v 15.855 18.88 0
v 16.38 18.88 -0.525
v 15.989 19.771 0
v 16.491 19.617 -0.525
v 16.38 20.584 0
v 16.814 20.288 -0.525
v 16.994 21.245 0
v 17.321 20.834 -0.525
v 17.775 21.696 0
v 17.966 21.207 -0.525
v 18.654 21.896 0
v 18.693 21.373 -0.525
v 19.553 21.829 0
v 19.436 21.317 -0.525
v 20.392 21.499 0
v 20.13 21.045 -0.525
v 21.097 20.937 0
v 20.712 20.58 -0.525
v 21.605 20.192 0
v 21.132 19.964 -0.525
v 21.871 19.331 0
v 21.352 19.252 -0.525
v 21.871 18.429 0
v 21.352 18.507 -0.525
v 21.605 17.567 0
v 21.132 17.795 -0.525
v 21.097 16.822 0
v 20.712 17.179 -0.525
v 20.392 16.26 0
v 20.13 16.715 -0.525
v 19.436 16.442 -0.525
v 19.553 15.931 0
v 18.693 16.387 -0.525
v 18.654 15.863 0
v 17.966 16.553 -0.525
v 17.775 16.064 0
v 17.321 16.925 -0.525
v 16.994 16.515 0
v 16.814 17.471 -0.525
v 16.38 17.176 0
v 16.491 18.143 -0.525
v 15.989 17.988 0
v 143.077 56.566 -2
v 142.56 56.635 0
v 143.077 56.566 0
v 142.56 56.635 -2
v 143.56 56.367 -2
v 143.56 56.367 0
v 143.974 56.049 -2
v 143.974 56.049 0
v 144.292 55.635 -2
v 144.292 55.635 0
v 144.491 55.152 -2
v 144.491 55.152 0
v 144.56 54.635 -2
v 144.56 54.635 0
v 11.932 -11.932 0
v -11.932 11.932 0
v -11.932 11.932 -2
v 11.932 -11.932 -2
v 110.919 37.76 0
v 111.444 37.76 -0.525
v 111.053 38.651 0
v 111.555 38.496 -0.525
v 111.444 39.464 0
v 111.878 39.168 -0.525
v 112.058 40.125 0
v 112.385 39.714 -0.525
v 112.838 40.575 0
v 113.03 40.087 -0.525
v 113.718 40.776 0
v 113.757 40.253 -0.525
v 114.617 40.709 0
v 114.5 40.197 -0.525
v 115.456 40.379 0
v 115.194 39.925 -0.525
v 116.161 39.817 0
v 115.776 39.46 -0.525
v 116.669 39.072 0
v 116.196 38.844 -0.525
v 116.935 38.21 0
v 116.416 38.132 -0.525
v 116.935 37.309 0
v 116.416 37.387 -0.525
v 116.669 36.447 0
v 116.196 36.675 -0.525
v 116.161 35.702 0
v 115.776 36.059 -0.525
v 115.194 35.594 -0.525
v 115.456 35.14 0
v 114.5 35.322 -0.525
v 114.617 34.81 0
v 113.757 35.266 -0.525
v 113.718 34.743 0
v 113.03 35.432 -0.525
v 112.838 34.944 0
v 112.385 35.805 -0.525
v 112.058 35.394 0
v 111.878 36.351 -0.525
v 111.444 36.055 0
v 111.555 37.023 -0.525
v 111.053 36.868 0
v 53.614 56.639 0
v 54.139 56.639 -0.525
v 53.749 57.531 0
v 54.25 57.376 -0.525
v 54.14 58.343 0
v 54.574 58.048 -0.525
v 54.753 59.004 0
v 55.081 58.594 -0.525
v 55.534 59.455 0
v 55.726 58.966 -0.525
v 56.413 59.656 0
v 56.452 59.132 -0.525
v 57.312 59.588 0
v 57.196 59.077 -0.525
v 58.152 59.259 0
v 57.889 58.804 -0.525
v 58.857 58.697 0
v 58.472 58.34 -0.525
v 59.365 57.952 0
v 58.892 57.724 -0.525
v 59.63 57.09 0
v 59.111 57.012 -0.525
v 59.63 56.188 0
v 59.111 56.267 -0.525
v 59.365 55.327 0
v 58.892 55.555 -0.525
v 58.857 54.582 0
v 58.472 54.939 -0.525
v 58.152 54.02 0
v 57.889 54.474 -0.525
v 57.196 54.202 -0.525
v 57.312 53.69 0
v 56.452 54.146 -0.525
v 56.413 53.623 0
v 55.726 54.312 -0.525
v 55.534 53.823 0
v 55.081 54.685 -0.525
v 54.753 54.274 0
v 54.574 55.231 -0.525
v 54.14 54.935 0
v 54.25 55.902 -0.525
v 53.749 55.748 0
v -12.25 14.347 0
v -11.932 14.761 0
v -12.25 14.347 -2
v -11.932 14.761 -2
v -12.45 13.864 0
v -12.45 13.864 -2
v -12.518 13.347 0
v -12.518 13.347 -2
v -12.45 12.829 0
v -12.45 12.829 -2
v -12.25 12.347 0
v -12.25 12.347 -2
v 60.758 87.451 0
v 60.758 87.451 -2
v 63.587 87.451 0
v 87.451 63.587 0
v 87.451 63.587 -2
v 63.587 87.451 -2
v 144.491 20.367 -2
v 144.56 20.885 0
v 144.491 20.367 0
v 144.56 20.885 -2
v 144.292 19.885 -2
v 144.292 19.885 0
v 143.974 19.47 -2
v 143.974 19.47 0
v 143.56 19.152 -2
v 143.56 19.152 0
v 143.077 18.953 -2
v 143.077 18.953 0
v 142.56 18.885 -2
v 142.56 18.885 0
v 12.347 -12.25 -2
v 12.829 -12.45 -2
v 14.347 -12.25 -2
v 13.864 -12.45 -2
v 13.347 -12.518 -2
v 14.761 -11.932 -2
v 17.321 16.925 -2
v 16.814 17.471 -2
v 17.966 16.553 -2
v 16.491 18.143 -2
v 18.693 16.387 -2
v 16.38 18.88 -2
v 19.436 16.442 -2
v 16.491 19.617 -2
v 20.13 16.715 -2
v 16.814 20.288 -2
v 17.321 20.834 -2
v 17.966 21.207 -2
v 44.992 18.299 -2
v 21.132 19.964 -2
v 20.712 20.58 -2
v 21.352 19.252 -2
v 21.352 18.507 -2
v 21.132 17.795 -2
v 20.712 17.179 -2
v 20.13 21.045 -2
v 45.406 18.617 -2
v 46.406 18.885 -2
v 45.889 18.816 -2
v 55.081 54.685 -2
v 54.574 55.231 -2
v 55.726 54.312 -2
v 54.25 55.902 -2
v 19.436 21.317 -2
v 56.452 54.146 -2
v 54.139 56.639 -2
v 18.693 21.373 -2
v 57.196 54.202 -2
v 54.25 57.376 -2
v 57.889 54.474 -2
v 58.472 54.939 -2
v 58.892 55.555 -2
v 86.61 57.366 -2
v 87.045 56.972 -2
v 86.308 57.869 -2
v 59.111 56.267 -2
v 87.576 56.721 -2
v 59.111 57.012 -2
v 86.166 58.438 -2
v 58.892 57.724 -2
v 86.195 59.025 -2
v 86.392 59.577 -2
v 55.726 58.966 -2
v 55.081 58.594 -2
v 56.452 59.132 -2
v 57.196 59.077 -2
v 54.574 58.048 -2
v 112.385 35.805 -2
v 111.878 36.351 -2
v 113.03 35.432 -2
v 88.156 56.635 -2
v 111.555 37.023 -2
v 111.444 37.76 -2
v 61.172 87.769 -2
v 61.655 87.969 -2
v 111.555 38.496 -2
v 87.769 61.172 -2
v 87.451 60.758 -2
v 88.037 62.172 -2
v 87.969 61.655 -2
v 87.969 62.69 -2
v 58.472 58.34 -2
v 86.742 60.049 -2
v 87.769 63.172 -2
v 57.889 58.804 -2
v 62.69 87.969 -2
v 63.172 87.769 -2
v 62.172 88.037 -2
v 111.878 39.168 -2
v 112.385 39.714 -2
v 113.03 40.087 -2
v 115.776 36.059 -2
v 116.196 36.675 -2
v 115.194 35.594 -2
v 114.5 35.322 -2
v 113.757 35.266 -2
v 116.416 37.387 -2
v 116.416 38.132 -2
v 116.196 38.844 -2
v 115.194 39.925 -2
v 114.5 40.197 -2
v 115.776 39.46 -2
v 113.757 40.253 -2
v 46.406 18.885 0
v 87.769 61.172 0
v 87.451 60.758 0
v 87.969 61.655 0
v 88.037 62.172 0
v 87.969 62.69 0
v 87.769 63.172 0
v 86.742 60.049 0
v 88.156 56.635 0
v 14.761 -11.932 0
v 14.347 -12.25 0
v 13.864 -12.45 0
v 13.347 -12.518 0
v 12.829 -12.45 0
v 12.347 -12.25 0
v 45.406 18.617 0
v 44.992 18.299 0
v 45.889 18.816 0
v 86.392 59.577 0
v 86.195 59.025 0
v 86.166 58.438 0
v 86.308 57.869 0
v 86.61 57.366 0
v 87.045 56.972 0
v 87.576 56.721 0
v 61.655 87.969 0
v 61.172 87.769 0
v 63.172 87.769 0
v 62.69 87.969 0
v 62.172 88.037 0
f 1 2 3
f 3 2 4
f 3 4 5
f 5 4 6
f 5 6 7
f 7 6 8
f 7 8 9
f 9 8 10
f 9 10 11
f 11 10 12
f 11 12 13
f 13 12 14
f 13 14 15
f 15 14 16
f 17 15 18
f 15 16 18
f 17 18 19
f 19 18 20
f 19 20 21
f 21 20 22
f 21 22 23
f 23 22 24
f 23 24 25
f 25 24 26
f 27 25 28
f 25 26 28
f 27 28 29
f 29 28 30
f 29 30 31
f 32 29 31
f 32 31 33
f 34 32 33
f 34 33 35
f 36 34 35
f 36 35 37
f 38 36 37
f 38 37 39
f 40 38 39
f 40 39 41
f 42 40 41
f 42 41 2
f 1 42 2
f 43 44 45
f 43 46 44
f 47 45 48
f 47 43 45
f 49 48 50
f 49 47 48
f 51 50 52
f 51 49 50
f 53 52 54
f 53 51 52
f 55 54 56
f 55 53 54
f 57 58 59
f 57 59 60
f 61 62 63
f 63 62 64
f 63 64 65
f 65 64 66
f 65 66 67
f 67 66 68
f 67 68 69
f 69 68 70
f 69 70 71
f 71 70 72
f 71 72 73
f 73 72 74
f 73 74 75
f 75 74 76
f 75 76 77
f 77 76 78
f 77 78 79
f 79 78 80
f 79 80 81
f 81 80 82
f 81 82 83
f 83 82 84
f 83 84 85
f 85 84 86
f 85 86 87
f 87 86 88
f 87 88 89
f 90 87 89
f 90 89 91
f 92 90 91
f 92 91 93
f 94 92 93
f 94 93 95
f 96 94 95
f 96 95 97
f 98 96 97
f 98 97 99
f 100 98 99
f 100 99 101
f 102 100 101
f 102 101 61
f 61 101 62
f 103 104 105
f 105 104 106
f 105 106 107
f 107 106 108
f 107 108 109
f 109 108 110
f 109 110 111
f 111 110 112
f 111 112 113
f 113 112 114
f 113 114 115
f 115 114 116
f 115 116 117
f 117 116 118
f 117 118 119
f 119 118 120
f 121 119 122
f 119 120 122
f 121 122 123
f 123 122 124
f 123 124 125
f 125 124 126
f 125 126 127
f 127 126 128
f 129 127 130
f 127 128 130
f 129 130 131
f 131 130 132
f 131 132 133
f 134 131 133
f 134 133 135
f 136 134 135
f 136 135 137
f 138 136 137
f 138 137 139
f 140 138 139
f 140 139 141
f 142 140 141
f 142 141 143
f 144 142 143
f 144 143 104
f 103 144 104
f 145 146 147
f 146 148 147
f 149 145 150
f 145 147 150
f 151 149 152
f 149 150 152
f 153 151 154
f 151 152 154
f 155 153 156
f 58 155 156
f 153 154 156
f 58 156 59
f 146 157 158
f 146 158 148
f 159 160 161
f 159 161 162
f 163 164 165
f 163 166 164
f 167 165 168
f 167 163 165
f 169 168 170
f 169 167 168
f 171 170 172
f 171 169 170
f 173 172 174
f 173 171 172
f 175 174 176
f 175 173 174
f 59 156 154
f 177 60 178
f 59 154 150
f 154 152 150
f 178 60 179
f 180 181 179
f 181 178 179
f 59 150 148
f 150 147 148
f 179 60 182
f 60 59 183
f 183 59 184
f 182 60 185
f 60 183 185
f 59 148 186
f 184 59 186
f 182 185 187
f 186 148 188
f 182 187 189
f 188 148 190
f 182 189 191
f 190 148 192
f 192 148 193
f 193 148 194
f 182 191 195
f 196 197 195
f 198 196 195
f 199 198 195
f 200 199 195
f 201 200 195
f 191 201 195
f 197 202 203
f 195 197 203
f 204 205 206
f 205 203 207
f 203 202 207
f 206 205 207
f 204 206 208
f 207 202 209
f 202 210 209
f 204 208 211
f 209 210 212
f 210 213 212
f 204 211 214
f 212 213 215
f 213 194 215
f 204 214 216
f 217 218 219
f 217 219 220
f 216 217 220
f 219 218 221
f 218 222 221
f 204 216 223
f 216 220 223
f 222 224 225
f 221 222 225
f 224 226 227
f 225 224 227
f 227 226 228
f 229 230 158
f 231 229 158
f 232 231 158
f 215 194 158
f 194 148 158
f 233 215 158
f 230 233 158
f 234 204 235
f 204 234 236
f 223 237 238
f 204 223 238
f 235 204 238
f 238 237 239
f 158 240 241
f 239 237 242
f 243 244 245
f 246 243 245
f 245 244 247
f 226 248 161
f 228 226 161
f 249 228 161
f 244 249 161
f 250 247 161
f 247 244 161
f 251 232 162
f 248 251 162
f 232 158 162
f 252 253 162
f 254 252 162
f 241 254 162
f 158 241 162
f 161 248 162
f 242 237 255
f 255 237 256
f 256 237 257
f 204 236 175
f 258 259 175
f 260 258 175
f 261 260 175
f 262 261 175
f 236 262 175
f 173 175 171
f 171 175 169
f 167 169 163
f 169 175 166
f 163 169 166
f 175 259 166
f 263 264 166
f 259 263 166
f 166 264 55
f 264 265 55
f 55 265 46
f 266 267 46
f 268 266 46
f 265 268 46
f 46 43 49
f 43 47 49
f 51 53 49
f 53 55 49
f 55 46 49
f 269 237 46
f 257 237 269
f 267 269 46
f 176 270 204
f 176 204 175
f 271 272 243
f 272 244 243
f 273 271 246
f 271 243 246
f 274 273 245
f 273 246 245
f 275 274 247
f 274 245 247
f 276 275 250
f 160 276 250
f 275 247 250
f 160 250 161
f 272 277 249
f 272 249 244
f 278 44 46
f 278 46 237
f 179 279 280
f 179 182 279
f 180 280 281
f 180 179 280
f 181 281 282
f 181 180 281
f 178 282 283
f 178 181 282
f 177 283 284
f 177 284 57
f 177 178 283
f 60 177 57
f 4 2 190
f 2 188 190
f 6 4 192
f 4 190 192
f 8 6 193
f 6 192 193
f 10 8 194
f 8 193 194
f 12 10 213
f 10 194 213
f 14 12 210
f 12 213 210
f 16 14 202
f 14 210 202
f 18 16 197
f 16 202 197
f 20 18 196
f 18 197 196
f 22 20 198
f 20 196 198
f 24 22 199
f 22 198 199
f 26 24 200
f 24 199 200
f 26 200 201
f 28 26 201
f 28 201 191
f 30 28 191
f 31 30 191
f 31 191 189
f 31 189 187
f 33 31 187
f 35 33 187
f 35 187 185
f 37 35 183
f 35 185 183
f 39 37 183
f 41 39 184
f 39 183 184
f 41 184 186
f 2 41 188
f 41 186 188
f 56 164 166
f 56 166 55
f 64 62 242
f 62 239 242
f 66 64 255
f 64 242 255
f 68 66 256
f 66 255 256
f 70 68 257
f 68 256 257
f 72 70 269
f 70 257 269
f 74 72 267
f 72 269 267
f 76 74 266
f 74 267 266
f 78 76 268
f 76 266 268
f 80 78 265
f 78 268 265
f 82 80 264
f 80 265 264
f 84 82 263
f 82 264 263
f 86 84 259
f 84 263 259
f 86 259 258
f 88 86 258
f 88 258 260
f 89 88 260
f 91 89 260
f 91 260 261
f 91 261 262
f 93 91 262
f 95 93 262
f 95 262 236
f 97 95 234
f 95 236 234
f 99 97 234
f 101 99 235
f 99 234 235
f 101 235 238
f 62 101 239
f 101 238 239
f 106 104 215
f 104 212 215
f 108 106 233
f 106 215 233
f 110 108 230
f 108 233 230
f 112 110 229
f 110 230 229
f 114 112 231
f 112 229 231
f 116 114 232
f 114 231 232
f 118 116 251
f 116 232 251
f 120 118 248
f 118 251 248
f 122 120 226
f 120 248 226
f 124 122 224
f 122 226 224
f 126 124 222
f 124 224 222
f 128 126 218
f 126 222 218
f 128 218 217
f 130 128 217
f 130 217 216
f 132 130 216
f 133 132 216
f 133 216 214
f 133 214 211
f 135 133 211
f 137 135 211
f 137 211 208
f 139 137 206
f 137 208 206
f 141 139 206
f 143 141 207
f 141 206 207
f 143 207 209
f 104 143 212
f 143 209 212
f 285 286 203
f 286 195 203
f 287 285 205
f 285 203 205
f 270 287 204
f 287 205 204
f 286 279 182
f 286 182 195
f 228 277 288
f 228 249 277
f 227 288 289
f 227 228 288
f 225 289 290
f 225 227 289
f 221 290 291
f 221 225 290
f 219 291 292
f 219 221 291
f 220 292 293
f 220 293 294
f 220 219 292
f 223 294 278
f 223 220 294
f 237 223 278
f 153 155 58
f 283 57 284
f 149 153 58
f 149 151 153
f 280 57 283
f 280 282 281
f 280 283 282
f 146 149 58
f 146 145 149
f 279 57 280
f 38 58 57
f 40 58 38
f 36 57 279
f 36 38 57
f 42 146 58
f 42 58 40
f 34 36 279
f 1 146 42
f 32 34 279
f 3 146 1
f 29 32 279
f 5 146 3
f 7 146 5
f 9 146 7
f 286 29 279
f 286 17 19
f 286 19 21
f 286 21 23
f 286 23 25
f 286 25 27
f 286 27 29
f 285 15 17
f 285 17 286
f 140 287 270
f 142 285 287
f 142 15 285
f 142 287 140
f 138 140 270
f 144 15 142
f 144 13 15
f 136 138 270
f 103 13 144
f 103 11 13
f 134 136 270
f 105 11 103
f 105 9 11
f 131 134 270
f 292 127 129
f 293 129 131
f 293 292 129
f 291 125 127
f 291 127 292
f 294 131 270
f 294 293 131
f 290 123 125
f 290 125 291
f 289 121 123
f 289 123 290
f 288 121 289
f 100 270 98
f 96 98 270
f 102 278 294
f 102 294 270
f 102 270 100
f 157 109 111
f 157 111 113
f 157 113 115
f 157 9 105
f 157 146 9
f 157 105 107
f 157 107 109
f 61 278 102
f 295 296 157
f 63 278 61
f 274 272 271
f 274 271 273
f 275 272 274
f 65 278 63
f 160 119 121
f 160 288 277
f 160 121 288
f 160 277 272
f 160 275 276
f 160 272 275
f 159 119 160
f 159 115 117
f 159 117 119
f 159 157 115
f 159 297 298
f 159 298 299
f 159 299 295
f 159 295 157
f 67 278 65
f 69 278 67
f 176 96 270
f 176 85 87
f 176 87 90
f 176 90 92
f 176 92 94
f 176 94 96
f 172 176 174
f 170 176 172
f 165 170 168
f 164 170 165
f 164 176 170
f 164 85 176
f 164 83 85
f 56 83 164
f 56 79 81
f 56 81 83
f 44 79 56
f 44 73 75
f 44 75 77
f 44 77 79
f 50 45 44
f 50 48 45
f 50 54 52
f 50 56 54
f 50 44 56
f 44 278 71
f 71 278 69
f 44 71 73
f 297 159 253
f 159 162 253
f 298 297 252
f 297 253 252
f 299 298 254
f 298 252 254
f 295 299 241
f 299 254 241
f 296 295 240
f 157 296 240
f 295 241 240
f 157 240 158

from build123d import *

# Parameters (mm, degrees)
BASE_FLANGE1_DEPTH              = 2
M6X1_0_TAPPED_HOLE1_D           = 5
M6X1_0_TAPPED_HOLE1_DEPTH       = 15
M6X1_0_TAPPED_HOLE1_CSINK_D     = 6.05
M6X1_0_TAPPED_HOLE1_CSINK_ANGLE = 90
M6X1_0_TAPPED_HOLE1_TIP         = 1.502151548
FILLET1_R                       = 2


# Sheet-metal steps are written as plain solids
with BuildPart() as part:
    # Sketch1 → Base-Flange1 (new body)
    with BuildSketch(Plane.XY):
        Polygon((13.346640495, -13.346640495), (45.577783105, 18.884502115), (144.559502115, 18.884502115), (144.559502115, 56.634502115), (83.327783105, 56.634502115), (88.865644726, 62.172363736), (62.172363736, 88.865644726), (-13.346640495, 13.346640495), align=None)
    extrude(amount=-BASE_FLANGE1_DEPTH)

    # M6x1.0 Tapped Hole1
    with Locations(Plane.XY):
        with Locations((56.639253173, 56.639253173), (18.879751058, 18.879751058), (113.94364261, 37.759502115)):
            CounterSinkHole(M6X1_0_TAPPED_HOLE1_D / 2, M6X1_0_TAPPED_HOLE1_CSINK_D / 2, depth=M6X1_0_TAPPED_HOLE1_DEPTH, counter_sink_angle=M6X1_0_TAPPED_HOLE1_CSINK_ANGLE)
            with Locations((0, 0, -(M6X1_0_TAPPED_HOLE1_DEPTH + M6X1_0_TAPPED_HOLE1_TIP / 2))):  # 118° drill point
                Cone(0, M6X1_0_TAPPED_HOLE1_D / 2, M6X1_0_TAPPED_HOLE1_TIP, mode=Mode.SUBTRACT)

    # Fillet1
    fillet1_edges = [part.edges().sort_by_distance(p)[0] for p in [
        (-13.346640495, 13.346640495, -1),
        (62.172363736, 88.865644726, -1),
        (88.865644726, 62.172363736, -1),
        (83.327783105, 56.634502115, -1),
        (144.559502115, 56.634502115, -1),
        (144.559502115, 18.884502115, -1),
        (45.577783105, 18.884502115, -1),
        (13.346640495, -13.346640495, -1),
    ]]
    fillet(fillet1_edges, radius=FILLET1_R)


solid = part.part
